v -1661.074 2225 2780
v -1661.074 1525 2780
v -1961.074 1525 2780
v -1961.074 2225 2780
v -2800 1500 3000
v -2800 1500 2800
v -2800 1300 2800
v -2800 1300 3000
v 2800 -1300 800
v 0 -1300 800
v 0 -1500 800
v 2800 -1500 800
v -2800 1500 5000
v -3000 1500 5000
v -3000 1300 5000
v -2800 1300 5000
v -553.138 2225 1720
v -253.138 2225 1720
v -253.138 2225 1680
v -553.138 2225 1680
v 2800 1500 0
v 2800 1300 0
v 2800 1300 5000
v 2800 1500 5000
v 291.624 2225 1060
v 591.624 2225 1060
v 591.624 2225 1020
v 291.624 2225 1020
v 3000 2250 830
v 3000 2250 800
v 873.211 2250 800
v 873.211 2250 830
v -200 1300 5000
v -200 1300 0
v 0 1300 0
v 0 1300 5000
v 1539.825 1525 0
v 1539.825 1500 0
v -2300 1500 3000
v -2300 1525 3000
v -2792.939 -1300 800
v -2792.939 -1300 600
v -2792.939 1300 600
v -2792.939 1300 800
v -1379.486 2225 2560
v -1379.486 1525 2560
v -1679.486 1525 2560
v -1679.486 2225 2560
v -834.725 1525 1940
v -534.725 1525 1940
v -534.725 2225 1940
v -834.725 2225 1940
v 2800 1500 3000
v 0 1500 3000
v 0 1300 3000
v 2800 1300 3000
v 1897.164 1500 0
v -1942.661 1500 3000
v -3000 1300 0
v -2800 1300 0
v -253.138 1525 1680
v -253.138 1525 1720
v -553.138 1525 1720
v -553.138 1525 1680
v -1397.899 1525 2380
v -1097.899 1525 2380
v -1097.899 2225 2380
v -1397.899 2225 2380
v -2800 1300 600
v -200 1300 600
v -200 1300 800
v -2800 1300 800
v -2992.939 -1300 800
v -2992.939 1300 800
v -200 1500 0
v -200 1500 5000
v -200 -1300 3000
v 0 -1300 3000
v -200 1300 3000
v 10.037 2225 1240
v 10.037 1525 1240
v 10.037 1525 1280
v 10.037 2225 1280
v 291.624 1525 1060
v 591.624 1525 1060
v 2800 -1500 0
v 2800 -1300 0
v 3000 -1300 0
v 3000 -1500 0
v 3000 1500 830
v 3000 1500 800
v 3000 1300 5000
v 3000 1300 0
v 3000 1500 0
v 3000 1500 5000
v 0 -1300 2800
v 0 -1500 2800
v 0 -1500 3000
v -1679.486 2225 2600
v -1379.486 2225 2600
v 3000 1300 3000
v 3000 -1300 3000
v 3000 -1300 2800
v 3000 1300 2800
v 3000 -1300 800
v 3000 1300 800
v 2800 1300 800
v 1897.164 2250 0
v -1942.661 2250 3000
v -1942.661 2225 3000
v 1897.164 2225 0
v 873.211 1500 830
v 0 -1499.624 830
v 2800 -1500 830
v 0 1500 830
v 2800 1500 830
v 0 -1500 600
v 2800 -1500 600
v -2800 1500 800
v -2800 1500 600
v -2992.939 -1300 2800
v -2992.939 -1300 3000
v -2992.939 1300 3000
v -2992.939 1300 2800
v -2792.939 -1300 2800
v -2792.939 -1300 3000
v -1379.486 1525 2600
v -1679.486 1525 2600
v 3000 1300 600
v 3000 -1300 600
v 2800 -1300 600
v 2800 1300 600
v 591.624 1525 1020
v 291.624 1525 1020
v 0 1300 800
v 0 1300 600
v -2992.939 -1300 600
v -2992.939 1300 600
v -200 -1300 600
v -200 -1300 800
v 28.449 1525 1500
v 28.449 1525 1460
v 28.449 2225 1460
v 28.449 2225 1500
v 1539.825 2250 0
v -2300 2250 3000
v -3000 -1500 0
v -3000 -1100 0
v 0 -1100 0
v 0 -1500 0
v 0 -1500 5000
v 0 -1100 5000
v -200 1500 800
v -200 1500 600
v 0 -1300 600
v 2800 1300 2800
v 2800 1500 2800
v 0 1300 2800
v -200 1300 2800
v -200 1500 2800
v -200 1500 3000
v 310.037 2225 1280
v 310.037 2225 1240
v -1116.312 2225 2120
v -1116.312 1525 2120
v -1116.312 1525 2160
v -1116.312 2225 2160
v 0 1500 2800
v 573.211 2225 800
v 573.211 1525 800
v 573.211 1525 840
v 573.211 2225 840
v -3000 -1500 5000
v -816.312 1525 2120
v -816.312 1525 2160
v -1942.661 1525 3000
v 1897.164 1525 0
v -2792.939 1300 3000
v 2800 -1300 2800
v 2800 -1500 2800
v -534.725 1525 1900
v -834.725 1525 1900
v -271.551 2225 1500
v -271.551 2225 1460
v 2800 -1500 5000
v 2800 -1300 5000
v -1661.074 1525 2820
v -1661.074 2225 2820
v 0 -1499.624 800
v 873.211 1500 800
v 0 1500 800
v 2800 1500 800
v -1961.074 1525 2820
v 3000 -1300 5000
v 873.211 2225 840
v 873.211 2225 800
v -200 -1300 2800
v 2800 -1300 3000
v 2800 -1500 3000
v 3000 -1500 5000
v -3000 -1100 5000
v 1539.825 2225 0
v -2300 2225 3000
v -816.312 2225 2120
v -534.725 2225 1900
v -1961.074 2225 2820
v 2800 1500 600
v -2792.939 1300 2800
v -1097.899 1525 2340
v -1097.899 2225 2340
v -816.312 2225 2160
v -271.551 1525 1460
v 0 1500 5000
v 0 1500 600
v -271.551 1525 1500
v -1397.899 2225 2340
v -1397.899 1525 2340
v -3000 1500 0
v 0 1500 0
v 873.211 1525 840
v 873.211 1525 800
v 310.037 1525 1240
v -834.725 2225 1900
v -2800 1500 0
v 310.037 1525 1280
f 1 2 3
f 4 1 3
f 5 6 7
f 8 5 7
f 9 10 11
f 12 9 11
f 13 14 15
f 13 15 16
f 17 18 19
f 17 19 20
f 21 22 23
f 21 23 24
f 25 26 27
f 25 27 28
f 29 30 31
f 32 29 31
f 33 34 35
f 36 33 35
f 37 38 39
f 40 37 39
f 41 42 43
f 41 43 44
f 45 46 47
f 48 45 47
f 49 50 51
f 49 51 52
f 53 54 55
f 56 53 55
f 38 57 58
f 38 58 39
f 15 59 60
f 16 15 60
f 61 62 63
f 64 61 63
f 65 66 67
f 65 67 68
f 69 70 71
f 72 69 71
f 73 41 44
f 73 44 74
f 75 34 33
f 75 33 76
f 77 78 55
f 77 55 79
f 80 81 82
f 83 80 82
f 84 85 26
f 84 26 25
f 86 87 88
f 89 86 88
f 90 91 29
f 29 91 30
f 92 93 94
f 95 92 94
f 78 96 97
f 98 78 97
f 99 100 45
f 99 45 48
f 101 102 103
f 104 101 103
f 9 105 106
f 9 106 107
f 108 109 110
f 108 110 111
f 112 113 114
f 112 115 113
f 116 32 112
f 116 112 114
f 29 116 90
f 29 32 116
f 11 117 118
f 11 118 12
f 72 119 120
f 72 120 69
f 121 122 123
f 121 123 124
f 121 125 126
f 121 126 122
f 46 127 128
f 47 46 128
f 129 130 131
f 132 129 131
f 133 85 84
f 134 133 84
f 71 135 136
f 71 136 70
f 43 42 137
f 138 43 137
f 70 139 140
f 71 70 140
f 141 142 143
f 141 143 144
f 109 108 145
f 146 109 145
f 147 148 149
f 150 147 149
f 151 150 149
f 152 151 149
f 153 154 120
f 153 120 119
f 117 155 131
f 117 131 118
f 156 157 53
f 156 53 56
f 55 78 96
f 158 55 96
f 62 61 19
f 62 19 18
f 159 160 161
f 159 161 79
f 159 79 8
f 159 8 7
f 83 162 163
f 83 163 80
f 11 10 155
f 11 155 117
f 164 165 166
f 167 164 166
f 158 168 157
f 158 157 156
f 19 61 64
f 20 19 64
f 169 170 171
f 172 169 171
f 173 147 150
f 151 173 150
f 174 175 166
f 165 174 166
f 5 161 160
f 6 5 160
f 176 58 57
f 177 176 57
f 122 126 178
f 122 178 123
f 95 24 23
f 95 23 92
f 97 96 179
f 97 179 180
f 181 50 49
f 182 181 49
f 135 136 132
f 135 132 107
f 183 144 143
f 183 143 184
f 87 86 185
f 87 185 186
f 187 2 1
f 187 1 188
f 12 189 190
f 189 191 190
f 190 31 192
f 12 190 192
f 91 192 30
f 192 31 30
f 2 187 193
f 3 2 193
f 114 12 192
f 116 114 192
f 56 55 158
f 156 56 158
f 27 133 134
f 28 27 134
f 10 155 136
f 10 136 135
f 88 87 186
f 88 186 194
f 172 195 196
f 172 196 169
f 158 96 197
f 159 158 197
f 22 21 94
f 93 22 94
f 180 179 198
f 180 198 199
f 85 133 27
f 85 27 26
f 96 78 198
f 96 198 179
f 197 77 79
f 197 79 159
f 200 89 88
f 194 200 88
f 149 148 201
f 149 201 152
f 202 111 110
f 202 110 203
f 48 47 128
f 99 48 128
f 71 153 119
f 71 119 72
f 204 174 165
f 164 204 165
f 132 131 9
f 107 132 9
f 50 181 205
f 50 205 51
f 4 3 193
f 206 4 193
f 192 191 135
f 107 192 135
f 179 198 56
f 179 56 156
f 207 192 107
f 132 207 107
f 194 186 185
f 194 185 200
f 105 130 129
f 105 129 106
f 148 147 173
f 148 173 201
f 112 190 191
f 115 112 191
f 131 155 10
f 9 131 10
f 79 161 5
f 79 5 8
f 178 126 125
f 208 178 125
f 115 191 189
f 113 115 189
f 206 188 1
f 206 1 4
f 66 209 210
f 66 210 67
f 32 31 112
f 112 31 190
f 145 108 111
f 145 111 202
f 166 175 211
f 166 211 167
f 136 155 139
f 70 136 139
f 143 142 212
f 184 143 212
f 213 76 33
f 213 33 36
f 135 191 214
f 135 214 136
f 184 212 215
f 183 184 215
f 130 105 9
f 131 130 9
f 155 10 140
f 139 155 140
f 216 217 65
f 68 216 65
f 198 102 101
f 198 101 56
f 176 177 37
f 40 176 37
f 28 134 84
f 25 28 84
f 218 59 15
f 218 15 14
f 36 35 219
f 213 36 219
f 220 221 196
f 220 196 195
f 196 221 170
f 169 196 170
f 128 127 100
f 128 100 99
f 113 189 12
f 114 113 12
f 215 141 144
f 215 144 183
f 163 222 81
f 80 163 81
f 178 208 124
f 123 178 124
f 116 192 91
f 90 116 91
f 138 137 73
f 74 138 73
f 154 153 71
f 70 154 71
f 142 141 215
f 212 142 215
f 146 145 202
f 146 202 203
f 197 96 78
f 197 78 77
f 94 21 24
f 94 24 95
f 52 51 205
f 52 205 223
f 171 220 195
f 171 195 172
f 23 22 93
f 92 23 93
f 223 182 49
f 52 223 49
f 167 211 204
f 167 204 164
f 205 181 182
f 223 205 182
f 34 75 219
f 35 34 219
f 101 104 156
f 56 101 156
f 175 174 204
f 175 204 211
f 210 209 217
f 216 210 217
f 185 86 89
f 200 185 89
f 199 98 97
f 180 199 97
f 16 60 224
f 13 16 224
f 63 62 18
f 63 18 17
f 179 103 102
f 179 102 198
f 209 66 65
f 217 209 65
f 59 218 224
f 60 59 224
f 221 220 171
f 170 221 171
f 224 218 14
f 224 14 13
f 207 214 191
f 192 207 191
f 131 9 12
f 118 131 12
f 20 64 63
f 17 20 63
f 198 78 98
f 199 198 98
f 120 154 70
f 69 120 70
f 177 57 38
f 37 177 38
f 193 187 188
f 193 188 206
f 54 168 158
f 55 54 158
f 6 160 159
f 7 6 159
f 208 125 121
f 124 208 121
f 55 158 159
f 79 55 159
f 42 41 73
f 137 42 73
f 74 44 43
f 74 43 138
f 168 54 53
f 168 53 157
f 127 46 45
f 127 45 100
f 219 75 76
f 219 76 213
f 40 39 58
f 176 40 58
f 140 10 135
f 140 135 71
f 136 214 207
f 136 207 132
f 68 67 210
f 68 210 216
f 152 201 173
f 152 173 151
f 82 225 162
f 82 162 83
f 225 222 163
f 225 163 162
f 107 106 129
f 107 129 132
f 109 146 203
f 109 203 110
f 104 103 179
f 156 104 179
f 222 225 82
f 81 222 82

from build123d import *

# Parameters (mm, degrees)
F1_W      = 200
F1_H      = 200
F2_DEPTH  = 5000
F3_W      = 3000
F3_H      = 400
F4_DEPTH  = 5000
F5_W      = 200
F5_H      = 200
F6_DEPTH  = 2600
F7_W      = 200
F7_H      = 200
F8_DEPTH  = 2800
F9_W      = 200
F9_H      = 200
F10_DEPTH = 2600
F14_DEPTH = 25
F15_W     = 300
F15_H     = 40
F16_DEPTH = 700
F20_DEPTH = 30


with BuildPart() as f2:
    # F1 (on Top) → F2 (new body)
    with BuildSketch(Plane.XY):
        with Locations((-2900, 1400)):
            Rectangle(F1_W, F1_H)
    extrude(amount=F2_DEPTH)


with BuildPart() as f2b:
    # F1 (on Top) → F2, piece 2 (new body)
    with BuildSketch(Plane.XY):
        with Locations((-100, 1400)):
            Rectangle(F1_W, F1_H)
    extrude(amount=F2_DEPTH)


with BuildPart() as f2c:
    # F1 (on Top) → F2, piece 3 (new body)
    with BuildSketch(Plane.XY):
        with Locations((2900, 1400)):
            Rectangle(F1_W, F1_H)
    extrude(amount=F2_DEPTH)


with BuildPart() as f2d:
    # F1 (on Top) → F2, piece 4 (new body)
    with BuildSketch(Plane.XY):
        with Locations((2900, -1400)):
            Rectangle(F1_W, F1_H)
    extrude(amount=F2_DEPTH)


with BuildPart() as f4:
    # F3 (on Top) → F4 (new body)
    with BuildSketch(Plane.XY):
        with Locations((-1500, -1300)):
            Rectangle(F3_W, F3_H)
    extrude(amount=F4_DEPTH)


with BuildPart() as f6:
    # F5 (on face) → F6 (new body)
    with BuildSketch(Plane(origin=(0, -1300, 0), x_dir=(-1, 0, 0), z_dir=(0, 1, 0))):
        with Locations((-2900, 700)):
            Rectangle(F5_W, F5_H)
    extrude(amount=F6_DEPTH)


with BuildPart() as f6b:
    # F5 (on face) → F6, piece 2 (new body)
    with BuildSketch(Plane(origin=(0, -1300, 0), x_dir=(-1, 0, 0), z_dir=(0, 1, 0))):
        with Locations((100, 700)):
            Rectangle(F5_W, F5_H)
    extrude(amount=F6_DEPTH)


with BuildPart() as f6c:
    # F5 (on face) → F6, piece 3 (new body)
    with BuildSketch(Plane(origin=(0, -1300, 0), x_dir=(-1, 0, 0), z_dir=(0, 1, 0))):
        with Locations((2892.9389476776, 700)):
            Rectangle(F5_W, F5_H)
    extrude(amount=F6_DEPTH)


with BuildPart() as f8:
    # F7 (on face) → F8 (new body)
    with BuildSketch(Plane(origin=(2800, 0, 0), x_dir=(0, -1, 0), z_dir=(-1, 0, 0))):
        with Locations((-1400, 700)):
            Rectangle(F7_W, F7_H)
    extrude(amount=F8_DEPTH)


with BuildPart() as f8b:
    # F7 (on face) → F8, piece 2 (new body)
    with BuildSketch(Plane(origin=(2800, 0, 0), x_dir=(0, -1, 0), z_dir=(-1, 0, 0))):
        with Locations((1400, 700)):
            Rectangle(F7_W, F7_H)
    extrude(amount=F8_DEPTH)


with BuildPart() as f10:
    # F9 (on face) → F10 (new body)
    with BuildSketch(Plane(origin=(-200, 0, 0), x_dir=(0, -1, 0), z_dir=(-1, 0, 0))):
        with Locations((-1400, 700)):
            Rectangle(F9_W, F9_H)
    extrude(amount=F10_DEPTH)


with BuildPart() as f12_1:
    # F12: instance of F8b
    add(f8b.part.mirror(Plane.XY.offset(1800)))


with BuildPart() as f12_2:
    # F12: instance of F6
    add(f6.part.mirror(Plane.XY.offset(1800)))


with BuildPart() as f12_3:
    # F12: instance of F8
    add(f8.part.mirror(Plane.XY.offset(1800)))


with BuildPart() as f12_4:
    # F12: instance of F6b
    add(f6b.part.mirror(Plane.XY.offset(1800)))


with BuildPart() as f12_5:
    # F12: instance of F10
    add(f10.part.mirror(Plane.XY.offset(1800)))


with BuildPart() as f12_6:
    # F12: instance of F6c
    add(f6c.part.mirror(Plane.XY.offset(1800)))


with BuildPart() as f14:
    # F13 (on face) → F14 (new body)
    with BuildSketch(Plane(origin=(0, 1500, 0), x_dir=(-1, 0, 0), z_dir=(0, 1, 0))):
        Polygon((1942.6607659938, 3000), (-1897.1641305854, 0), (-1539.8248965792, 0), (2300, 3000), align=None)
    extrude(amount=F14_DEPTH)


with BuildPart() as f16:
    # F15 (on face) → F16 (new body)
    with BuildSketch(Plane(origin=(0, 1525, 0), x_dir=(-1, 0, 0), z_dir=(0, 1, 0))):
        with Locations((-723.210824831, 820)):
            Rectangle(F15_W, F15_H)
    extrude(amount=F16_DEPTH)


with BuildPart() as f16b:
    # F15 (on face) → F16, piece 2 (new body)
    with BuildSketch(Plane(origin=(0, 1525, 0), x_dir=(-1, 0, 0), z_dir=(0, 1, 0))):
        with Locations((-441.6236657485, 1040)):
            Rectangle(F15_W, F15_H)
    extrude(amount=F16_DEPTH)


with BuildPart() as f16c:
    # F15 (on face) → F16, piece 3 (new body)
    with BuildSketch(Plane(origin=(0, 1525, 0), x_dir=(-1, 0, 0), z_dir=(0, 1, 0))):
        with Locations((-160.036506666, 1260)):
            Rectangle(F15_W, F15_H)
    extrude(amount=F16_DEPTH)


with BuildPart() as f16d:
    # F15 (on face) → F16, piece 4 (new body)
    with BuildSketch(Plane(origin=(0, 1525, 0), x_dir=(-1, 0, 0), z_dir=(0, 1, 0))):
        with Locations((121.5506524165, 1480)):
            Rectangle(F15_W, F15_H)
    extrude(amount=F16_DEPTH)


with BuildPart() as f16e:
    # F15 (on face) → F16, piece 5 (new body)
    with BuildSketch(Plane(origin=(0, 1525, 0), x_dir=(-1, 0, 0), z_dir=(0, 1, 0))):
        with Locations((403.1378114989, 1700)):
            Rectangle(F15_W, F15_H)
    extrude(amount=F16_DEPTH)


with BuildPart() as f16f:
    # F15 (on face) → F16, piece 6 (new body)
    with BuildSketch(Plane(origin=(0, 1525, 0), x_dir=(-1, 0, 0), z_dir=(0, 1, 0))):
        with Locations((684.7249705814, 1920)):
            Rectangle(F15_W, F15_H)
    extrude(amount=F16_DEPTH)


with BuildPart() as f16g:
    # F15 (on face) → F16, piece 7 (new body)
    with BuildSketch(Plane(origin=(0, 1525, 0), x_dir=(-1, 0, 0), z_dir=(0, 1, 0))):
        with Locations((966.3121296639, 2140)):
            Rectangle(F15_W, F15_H)
    extrude(amount=F16_DEPTH)


with BuildPart() as f16h:
    # F15 (on face) → F16, piece 8 (new body)
    with BuildSketch(Plane(origin=(0, 1525, 0), x_dir=(-1, 0, 0), z_dir=(0, 1, 0))):
        with Locations((1247.8992887464, 2360)):
            Rectangle(F15_W, F15_H)
    extrude(amount=F16_DEPTH)


with BuildPart() as f16i:
    # F15 (on face) → F16, piece 9 (new body)
    with BuildSketch(Plane(origin=(0, 1525, 0), x_dir=(-1, 0, 0), z_dir=(0, 1, 0))):
        with Locations((1529.4864478288, 2580)):
            Rectangle(F15_W, F15_H)
    extrude(amount=F16_DEPTH)


with BuildPart() as f16j:
    # F15 (on face) → F16, piece 10 (new body)
    with BuildSketch(Plane(origin=(0, 1525, 0), x_dir=(-1, 0, 0), z_dir=(0, 1, 0))):
        with Locations((1811.0736069113, 2800)):
            Rectangle(F15_W, F15_H)
    extrude(amount=F16_DEPTH)


with BuildPart() as f18_1:
    # F18: instance of F14
    add(f14.part.mirror(Plane(origin=(-201.4179347073, 1875, 1500), x_dir=(-1, 0, 0), z_dir=(0, 1, 0))))


with BuildPart() as f20:
    # F19 (on face) → F20 (new body)
    with BuildSketch(Plane.XY.offset(800)):
        Polygon((0, -1499.6237754822), (2800, -1500), (2800, -1300), (2800, 1300), (2800, 1500), (3000, 1500), (3000, 2250), (873.210824831, 2250), (873.210824831, 1500), (0, 1500), (0, -1300), align=None)
    extrude(amount=F20_DEPTH)


solid = Compound([f2.part, f2b.part, f2c.part, f2d.part, f4.part, f6.part, f6b.part, f6c.part, f8.part, f8b.part, f10.part, f12_1.part, f12_2.part, f12_3.part, f12_4.part, f12_5.part, f12_6.part, f14.part, f16.part, f16b.part, f16c.part, f16d.part, f16e.part, f16f.part, f16g.part, f16h.part, f16i.part, f16j.part, f18_1.part, f20.part])
